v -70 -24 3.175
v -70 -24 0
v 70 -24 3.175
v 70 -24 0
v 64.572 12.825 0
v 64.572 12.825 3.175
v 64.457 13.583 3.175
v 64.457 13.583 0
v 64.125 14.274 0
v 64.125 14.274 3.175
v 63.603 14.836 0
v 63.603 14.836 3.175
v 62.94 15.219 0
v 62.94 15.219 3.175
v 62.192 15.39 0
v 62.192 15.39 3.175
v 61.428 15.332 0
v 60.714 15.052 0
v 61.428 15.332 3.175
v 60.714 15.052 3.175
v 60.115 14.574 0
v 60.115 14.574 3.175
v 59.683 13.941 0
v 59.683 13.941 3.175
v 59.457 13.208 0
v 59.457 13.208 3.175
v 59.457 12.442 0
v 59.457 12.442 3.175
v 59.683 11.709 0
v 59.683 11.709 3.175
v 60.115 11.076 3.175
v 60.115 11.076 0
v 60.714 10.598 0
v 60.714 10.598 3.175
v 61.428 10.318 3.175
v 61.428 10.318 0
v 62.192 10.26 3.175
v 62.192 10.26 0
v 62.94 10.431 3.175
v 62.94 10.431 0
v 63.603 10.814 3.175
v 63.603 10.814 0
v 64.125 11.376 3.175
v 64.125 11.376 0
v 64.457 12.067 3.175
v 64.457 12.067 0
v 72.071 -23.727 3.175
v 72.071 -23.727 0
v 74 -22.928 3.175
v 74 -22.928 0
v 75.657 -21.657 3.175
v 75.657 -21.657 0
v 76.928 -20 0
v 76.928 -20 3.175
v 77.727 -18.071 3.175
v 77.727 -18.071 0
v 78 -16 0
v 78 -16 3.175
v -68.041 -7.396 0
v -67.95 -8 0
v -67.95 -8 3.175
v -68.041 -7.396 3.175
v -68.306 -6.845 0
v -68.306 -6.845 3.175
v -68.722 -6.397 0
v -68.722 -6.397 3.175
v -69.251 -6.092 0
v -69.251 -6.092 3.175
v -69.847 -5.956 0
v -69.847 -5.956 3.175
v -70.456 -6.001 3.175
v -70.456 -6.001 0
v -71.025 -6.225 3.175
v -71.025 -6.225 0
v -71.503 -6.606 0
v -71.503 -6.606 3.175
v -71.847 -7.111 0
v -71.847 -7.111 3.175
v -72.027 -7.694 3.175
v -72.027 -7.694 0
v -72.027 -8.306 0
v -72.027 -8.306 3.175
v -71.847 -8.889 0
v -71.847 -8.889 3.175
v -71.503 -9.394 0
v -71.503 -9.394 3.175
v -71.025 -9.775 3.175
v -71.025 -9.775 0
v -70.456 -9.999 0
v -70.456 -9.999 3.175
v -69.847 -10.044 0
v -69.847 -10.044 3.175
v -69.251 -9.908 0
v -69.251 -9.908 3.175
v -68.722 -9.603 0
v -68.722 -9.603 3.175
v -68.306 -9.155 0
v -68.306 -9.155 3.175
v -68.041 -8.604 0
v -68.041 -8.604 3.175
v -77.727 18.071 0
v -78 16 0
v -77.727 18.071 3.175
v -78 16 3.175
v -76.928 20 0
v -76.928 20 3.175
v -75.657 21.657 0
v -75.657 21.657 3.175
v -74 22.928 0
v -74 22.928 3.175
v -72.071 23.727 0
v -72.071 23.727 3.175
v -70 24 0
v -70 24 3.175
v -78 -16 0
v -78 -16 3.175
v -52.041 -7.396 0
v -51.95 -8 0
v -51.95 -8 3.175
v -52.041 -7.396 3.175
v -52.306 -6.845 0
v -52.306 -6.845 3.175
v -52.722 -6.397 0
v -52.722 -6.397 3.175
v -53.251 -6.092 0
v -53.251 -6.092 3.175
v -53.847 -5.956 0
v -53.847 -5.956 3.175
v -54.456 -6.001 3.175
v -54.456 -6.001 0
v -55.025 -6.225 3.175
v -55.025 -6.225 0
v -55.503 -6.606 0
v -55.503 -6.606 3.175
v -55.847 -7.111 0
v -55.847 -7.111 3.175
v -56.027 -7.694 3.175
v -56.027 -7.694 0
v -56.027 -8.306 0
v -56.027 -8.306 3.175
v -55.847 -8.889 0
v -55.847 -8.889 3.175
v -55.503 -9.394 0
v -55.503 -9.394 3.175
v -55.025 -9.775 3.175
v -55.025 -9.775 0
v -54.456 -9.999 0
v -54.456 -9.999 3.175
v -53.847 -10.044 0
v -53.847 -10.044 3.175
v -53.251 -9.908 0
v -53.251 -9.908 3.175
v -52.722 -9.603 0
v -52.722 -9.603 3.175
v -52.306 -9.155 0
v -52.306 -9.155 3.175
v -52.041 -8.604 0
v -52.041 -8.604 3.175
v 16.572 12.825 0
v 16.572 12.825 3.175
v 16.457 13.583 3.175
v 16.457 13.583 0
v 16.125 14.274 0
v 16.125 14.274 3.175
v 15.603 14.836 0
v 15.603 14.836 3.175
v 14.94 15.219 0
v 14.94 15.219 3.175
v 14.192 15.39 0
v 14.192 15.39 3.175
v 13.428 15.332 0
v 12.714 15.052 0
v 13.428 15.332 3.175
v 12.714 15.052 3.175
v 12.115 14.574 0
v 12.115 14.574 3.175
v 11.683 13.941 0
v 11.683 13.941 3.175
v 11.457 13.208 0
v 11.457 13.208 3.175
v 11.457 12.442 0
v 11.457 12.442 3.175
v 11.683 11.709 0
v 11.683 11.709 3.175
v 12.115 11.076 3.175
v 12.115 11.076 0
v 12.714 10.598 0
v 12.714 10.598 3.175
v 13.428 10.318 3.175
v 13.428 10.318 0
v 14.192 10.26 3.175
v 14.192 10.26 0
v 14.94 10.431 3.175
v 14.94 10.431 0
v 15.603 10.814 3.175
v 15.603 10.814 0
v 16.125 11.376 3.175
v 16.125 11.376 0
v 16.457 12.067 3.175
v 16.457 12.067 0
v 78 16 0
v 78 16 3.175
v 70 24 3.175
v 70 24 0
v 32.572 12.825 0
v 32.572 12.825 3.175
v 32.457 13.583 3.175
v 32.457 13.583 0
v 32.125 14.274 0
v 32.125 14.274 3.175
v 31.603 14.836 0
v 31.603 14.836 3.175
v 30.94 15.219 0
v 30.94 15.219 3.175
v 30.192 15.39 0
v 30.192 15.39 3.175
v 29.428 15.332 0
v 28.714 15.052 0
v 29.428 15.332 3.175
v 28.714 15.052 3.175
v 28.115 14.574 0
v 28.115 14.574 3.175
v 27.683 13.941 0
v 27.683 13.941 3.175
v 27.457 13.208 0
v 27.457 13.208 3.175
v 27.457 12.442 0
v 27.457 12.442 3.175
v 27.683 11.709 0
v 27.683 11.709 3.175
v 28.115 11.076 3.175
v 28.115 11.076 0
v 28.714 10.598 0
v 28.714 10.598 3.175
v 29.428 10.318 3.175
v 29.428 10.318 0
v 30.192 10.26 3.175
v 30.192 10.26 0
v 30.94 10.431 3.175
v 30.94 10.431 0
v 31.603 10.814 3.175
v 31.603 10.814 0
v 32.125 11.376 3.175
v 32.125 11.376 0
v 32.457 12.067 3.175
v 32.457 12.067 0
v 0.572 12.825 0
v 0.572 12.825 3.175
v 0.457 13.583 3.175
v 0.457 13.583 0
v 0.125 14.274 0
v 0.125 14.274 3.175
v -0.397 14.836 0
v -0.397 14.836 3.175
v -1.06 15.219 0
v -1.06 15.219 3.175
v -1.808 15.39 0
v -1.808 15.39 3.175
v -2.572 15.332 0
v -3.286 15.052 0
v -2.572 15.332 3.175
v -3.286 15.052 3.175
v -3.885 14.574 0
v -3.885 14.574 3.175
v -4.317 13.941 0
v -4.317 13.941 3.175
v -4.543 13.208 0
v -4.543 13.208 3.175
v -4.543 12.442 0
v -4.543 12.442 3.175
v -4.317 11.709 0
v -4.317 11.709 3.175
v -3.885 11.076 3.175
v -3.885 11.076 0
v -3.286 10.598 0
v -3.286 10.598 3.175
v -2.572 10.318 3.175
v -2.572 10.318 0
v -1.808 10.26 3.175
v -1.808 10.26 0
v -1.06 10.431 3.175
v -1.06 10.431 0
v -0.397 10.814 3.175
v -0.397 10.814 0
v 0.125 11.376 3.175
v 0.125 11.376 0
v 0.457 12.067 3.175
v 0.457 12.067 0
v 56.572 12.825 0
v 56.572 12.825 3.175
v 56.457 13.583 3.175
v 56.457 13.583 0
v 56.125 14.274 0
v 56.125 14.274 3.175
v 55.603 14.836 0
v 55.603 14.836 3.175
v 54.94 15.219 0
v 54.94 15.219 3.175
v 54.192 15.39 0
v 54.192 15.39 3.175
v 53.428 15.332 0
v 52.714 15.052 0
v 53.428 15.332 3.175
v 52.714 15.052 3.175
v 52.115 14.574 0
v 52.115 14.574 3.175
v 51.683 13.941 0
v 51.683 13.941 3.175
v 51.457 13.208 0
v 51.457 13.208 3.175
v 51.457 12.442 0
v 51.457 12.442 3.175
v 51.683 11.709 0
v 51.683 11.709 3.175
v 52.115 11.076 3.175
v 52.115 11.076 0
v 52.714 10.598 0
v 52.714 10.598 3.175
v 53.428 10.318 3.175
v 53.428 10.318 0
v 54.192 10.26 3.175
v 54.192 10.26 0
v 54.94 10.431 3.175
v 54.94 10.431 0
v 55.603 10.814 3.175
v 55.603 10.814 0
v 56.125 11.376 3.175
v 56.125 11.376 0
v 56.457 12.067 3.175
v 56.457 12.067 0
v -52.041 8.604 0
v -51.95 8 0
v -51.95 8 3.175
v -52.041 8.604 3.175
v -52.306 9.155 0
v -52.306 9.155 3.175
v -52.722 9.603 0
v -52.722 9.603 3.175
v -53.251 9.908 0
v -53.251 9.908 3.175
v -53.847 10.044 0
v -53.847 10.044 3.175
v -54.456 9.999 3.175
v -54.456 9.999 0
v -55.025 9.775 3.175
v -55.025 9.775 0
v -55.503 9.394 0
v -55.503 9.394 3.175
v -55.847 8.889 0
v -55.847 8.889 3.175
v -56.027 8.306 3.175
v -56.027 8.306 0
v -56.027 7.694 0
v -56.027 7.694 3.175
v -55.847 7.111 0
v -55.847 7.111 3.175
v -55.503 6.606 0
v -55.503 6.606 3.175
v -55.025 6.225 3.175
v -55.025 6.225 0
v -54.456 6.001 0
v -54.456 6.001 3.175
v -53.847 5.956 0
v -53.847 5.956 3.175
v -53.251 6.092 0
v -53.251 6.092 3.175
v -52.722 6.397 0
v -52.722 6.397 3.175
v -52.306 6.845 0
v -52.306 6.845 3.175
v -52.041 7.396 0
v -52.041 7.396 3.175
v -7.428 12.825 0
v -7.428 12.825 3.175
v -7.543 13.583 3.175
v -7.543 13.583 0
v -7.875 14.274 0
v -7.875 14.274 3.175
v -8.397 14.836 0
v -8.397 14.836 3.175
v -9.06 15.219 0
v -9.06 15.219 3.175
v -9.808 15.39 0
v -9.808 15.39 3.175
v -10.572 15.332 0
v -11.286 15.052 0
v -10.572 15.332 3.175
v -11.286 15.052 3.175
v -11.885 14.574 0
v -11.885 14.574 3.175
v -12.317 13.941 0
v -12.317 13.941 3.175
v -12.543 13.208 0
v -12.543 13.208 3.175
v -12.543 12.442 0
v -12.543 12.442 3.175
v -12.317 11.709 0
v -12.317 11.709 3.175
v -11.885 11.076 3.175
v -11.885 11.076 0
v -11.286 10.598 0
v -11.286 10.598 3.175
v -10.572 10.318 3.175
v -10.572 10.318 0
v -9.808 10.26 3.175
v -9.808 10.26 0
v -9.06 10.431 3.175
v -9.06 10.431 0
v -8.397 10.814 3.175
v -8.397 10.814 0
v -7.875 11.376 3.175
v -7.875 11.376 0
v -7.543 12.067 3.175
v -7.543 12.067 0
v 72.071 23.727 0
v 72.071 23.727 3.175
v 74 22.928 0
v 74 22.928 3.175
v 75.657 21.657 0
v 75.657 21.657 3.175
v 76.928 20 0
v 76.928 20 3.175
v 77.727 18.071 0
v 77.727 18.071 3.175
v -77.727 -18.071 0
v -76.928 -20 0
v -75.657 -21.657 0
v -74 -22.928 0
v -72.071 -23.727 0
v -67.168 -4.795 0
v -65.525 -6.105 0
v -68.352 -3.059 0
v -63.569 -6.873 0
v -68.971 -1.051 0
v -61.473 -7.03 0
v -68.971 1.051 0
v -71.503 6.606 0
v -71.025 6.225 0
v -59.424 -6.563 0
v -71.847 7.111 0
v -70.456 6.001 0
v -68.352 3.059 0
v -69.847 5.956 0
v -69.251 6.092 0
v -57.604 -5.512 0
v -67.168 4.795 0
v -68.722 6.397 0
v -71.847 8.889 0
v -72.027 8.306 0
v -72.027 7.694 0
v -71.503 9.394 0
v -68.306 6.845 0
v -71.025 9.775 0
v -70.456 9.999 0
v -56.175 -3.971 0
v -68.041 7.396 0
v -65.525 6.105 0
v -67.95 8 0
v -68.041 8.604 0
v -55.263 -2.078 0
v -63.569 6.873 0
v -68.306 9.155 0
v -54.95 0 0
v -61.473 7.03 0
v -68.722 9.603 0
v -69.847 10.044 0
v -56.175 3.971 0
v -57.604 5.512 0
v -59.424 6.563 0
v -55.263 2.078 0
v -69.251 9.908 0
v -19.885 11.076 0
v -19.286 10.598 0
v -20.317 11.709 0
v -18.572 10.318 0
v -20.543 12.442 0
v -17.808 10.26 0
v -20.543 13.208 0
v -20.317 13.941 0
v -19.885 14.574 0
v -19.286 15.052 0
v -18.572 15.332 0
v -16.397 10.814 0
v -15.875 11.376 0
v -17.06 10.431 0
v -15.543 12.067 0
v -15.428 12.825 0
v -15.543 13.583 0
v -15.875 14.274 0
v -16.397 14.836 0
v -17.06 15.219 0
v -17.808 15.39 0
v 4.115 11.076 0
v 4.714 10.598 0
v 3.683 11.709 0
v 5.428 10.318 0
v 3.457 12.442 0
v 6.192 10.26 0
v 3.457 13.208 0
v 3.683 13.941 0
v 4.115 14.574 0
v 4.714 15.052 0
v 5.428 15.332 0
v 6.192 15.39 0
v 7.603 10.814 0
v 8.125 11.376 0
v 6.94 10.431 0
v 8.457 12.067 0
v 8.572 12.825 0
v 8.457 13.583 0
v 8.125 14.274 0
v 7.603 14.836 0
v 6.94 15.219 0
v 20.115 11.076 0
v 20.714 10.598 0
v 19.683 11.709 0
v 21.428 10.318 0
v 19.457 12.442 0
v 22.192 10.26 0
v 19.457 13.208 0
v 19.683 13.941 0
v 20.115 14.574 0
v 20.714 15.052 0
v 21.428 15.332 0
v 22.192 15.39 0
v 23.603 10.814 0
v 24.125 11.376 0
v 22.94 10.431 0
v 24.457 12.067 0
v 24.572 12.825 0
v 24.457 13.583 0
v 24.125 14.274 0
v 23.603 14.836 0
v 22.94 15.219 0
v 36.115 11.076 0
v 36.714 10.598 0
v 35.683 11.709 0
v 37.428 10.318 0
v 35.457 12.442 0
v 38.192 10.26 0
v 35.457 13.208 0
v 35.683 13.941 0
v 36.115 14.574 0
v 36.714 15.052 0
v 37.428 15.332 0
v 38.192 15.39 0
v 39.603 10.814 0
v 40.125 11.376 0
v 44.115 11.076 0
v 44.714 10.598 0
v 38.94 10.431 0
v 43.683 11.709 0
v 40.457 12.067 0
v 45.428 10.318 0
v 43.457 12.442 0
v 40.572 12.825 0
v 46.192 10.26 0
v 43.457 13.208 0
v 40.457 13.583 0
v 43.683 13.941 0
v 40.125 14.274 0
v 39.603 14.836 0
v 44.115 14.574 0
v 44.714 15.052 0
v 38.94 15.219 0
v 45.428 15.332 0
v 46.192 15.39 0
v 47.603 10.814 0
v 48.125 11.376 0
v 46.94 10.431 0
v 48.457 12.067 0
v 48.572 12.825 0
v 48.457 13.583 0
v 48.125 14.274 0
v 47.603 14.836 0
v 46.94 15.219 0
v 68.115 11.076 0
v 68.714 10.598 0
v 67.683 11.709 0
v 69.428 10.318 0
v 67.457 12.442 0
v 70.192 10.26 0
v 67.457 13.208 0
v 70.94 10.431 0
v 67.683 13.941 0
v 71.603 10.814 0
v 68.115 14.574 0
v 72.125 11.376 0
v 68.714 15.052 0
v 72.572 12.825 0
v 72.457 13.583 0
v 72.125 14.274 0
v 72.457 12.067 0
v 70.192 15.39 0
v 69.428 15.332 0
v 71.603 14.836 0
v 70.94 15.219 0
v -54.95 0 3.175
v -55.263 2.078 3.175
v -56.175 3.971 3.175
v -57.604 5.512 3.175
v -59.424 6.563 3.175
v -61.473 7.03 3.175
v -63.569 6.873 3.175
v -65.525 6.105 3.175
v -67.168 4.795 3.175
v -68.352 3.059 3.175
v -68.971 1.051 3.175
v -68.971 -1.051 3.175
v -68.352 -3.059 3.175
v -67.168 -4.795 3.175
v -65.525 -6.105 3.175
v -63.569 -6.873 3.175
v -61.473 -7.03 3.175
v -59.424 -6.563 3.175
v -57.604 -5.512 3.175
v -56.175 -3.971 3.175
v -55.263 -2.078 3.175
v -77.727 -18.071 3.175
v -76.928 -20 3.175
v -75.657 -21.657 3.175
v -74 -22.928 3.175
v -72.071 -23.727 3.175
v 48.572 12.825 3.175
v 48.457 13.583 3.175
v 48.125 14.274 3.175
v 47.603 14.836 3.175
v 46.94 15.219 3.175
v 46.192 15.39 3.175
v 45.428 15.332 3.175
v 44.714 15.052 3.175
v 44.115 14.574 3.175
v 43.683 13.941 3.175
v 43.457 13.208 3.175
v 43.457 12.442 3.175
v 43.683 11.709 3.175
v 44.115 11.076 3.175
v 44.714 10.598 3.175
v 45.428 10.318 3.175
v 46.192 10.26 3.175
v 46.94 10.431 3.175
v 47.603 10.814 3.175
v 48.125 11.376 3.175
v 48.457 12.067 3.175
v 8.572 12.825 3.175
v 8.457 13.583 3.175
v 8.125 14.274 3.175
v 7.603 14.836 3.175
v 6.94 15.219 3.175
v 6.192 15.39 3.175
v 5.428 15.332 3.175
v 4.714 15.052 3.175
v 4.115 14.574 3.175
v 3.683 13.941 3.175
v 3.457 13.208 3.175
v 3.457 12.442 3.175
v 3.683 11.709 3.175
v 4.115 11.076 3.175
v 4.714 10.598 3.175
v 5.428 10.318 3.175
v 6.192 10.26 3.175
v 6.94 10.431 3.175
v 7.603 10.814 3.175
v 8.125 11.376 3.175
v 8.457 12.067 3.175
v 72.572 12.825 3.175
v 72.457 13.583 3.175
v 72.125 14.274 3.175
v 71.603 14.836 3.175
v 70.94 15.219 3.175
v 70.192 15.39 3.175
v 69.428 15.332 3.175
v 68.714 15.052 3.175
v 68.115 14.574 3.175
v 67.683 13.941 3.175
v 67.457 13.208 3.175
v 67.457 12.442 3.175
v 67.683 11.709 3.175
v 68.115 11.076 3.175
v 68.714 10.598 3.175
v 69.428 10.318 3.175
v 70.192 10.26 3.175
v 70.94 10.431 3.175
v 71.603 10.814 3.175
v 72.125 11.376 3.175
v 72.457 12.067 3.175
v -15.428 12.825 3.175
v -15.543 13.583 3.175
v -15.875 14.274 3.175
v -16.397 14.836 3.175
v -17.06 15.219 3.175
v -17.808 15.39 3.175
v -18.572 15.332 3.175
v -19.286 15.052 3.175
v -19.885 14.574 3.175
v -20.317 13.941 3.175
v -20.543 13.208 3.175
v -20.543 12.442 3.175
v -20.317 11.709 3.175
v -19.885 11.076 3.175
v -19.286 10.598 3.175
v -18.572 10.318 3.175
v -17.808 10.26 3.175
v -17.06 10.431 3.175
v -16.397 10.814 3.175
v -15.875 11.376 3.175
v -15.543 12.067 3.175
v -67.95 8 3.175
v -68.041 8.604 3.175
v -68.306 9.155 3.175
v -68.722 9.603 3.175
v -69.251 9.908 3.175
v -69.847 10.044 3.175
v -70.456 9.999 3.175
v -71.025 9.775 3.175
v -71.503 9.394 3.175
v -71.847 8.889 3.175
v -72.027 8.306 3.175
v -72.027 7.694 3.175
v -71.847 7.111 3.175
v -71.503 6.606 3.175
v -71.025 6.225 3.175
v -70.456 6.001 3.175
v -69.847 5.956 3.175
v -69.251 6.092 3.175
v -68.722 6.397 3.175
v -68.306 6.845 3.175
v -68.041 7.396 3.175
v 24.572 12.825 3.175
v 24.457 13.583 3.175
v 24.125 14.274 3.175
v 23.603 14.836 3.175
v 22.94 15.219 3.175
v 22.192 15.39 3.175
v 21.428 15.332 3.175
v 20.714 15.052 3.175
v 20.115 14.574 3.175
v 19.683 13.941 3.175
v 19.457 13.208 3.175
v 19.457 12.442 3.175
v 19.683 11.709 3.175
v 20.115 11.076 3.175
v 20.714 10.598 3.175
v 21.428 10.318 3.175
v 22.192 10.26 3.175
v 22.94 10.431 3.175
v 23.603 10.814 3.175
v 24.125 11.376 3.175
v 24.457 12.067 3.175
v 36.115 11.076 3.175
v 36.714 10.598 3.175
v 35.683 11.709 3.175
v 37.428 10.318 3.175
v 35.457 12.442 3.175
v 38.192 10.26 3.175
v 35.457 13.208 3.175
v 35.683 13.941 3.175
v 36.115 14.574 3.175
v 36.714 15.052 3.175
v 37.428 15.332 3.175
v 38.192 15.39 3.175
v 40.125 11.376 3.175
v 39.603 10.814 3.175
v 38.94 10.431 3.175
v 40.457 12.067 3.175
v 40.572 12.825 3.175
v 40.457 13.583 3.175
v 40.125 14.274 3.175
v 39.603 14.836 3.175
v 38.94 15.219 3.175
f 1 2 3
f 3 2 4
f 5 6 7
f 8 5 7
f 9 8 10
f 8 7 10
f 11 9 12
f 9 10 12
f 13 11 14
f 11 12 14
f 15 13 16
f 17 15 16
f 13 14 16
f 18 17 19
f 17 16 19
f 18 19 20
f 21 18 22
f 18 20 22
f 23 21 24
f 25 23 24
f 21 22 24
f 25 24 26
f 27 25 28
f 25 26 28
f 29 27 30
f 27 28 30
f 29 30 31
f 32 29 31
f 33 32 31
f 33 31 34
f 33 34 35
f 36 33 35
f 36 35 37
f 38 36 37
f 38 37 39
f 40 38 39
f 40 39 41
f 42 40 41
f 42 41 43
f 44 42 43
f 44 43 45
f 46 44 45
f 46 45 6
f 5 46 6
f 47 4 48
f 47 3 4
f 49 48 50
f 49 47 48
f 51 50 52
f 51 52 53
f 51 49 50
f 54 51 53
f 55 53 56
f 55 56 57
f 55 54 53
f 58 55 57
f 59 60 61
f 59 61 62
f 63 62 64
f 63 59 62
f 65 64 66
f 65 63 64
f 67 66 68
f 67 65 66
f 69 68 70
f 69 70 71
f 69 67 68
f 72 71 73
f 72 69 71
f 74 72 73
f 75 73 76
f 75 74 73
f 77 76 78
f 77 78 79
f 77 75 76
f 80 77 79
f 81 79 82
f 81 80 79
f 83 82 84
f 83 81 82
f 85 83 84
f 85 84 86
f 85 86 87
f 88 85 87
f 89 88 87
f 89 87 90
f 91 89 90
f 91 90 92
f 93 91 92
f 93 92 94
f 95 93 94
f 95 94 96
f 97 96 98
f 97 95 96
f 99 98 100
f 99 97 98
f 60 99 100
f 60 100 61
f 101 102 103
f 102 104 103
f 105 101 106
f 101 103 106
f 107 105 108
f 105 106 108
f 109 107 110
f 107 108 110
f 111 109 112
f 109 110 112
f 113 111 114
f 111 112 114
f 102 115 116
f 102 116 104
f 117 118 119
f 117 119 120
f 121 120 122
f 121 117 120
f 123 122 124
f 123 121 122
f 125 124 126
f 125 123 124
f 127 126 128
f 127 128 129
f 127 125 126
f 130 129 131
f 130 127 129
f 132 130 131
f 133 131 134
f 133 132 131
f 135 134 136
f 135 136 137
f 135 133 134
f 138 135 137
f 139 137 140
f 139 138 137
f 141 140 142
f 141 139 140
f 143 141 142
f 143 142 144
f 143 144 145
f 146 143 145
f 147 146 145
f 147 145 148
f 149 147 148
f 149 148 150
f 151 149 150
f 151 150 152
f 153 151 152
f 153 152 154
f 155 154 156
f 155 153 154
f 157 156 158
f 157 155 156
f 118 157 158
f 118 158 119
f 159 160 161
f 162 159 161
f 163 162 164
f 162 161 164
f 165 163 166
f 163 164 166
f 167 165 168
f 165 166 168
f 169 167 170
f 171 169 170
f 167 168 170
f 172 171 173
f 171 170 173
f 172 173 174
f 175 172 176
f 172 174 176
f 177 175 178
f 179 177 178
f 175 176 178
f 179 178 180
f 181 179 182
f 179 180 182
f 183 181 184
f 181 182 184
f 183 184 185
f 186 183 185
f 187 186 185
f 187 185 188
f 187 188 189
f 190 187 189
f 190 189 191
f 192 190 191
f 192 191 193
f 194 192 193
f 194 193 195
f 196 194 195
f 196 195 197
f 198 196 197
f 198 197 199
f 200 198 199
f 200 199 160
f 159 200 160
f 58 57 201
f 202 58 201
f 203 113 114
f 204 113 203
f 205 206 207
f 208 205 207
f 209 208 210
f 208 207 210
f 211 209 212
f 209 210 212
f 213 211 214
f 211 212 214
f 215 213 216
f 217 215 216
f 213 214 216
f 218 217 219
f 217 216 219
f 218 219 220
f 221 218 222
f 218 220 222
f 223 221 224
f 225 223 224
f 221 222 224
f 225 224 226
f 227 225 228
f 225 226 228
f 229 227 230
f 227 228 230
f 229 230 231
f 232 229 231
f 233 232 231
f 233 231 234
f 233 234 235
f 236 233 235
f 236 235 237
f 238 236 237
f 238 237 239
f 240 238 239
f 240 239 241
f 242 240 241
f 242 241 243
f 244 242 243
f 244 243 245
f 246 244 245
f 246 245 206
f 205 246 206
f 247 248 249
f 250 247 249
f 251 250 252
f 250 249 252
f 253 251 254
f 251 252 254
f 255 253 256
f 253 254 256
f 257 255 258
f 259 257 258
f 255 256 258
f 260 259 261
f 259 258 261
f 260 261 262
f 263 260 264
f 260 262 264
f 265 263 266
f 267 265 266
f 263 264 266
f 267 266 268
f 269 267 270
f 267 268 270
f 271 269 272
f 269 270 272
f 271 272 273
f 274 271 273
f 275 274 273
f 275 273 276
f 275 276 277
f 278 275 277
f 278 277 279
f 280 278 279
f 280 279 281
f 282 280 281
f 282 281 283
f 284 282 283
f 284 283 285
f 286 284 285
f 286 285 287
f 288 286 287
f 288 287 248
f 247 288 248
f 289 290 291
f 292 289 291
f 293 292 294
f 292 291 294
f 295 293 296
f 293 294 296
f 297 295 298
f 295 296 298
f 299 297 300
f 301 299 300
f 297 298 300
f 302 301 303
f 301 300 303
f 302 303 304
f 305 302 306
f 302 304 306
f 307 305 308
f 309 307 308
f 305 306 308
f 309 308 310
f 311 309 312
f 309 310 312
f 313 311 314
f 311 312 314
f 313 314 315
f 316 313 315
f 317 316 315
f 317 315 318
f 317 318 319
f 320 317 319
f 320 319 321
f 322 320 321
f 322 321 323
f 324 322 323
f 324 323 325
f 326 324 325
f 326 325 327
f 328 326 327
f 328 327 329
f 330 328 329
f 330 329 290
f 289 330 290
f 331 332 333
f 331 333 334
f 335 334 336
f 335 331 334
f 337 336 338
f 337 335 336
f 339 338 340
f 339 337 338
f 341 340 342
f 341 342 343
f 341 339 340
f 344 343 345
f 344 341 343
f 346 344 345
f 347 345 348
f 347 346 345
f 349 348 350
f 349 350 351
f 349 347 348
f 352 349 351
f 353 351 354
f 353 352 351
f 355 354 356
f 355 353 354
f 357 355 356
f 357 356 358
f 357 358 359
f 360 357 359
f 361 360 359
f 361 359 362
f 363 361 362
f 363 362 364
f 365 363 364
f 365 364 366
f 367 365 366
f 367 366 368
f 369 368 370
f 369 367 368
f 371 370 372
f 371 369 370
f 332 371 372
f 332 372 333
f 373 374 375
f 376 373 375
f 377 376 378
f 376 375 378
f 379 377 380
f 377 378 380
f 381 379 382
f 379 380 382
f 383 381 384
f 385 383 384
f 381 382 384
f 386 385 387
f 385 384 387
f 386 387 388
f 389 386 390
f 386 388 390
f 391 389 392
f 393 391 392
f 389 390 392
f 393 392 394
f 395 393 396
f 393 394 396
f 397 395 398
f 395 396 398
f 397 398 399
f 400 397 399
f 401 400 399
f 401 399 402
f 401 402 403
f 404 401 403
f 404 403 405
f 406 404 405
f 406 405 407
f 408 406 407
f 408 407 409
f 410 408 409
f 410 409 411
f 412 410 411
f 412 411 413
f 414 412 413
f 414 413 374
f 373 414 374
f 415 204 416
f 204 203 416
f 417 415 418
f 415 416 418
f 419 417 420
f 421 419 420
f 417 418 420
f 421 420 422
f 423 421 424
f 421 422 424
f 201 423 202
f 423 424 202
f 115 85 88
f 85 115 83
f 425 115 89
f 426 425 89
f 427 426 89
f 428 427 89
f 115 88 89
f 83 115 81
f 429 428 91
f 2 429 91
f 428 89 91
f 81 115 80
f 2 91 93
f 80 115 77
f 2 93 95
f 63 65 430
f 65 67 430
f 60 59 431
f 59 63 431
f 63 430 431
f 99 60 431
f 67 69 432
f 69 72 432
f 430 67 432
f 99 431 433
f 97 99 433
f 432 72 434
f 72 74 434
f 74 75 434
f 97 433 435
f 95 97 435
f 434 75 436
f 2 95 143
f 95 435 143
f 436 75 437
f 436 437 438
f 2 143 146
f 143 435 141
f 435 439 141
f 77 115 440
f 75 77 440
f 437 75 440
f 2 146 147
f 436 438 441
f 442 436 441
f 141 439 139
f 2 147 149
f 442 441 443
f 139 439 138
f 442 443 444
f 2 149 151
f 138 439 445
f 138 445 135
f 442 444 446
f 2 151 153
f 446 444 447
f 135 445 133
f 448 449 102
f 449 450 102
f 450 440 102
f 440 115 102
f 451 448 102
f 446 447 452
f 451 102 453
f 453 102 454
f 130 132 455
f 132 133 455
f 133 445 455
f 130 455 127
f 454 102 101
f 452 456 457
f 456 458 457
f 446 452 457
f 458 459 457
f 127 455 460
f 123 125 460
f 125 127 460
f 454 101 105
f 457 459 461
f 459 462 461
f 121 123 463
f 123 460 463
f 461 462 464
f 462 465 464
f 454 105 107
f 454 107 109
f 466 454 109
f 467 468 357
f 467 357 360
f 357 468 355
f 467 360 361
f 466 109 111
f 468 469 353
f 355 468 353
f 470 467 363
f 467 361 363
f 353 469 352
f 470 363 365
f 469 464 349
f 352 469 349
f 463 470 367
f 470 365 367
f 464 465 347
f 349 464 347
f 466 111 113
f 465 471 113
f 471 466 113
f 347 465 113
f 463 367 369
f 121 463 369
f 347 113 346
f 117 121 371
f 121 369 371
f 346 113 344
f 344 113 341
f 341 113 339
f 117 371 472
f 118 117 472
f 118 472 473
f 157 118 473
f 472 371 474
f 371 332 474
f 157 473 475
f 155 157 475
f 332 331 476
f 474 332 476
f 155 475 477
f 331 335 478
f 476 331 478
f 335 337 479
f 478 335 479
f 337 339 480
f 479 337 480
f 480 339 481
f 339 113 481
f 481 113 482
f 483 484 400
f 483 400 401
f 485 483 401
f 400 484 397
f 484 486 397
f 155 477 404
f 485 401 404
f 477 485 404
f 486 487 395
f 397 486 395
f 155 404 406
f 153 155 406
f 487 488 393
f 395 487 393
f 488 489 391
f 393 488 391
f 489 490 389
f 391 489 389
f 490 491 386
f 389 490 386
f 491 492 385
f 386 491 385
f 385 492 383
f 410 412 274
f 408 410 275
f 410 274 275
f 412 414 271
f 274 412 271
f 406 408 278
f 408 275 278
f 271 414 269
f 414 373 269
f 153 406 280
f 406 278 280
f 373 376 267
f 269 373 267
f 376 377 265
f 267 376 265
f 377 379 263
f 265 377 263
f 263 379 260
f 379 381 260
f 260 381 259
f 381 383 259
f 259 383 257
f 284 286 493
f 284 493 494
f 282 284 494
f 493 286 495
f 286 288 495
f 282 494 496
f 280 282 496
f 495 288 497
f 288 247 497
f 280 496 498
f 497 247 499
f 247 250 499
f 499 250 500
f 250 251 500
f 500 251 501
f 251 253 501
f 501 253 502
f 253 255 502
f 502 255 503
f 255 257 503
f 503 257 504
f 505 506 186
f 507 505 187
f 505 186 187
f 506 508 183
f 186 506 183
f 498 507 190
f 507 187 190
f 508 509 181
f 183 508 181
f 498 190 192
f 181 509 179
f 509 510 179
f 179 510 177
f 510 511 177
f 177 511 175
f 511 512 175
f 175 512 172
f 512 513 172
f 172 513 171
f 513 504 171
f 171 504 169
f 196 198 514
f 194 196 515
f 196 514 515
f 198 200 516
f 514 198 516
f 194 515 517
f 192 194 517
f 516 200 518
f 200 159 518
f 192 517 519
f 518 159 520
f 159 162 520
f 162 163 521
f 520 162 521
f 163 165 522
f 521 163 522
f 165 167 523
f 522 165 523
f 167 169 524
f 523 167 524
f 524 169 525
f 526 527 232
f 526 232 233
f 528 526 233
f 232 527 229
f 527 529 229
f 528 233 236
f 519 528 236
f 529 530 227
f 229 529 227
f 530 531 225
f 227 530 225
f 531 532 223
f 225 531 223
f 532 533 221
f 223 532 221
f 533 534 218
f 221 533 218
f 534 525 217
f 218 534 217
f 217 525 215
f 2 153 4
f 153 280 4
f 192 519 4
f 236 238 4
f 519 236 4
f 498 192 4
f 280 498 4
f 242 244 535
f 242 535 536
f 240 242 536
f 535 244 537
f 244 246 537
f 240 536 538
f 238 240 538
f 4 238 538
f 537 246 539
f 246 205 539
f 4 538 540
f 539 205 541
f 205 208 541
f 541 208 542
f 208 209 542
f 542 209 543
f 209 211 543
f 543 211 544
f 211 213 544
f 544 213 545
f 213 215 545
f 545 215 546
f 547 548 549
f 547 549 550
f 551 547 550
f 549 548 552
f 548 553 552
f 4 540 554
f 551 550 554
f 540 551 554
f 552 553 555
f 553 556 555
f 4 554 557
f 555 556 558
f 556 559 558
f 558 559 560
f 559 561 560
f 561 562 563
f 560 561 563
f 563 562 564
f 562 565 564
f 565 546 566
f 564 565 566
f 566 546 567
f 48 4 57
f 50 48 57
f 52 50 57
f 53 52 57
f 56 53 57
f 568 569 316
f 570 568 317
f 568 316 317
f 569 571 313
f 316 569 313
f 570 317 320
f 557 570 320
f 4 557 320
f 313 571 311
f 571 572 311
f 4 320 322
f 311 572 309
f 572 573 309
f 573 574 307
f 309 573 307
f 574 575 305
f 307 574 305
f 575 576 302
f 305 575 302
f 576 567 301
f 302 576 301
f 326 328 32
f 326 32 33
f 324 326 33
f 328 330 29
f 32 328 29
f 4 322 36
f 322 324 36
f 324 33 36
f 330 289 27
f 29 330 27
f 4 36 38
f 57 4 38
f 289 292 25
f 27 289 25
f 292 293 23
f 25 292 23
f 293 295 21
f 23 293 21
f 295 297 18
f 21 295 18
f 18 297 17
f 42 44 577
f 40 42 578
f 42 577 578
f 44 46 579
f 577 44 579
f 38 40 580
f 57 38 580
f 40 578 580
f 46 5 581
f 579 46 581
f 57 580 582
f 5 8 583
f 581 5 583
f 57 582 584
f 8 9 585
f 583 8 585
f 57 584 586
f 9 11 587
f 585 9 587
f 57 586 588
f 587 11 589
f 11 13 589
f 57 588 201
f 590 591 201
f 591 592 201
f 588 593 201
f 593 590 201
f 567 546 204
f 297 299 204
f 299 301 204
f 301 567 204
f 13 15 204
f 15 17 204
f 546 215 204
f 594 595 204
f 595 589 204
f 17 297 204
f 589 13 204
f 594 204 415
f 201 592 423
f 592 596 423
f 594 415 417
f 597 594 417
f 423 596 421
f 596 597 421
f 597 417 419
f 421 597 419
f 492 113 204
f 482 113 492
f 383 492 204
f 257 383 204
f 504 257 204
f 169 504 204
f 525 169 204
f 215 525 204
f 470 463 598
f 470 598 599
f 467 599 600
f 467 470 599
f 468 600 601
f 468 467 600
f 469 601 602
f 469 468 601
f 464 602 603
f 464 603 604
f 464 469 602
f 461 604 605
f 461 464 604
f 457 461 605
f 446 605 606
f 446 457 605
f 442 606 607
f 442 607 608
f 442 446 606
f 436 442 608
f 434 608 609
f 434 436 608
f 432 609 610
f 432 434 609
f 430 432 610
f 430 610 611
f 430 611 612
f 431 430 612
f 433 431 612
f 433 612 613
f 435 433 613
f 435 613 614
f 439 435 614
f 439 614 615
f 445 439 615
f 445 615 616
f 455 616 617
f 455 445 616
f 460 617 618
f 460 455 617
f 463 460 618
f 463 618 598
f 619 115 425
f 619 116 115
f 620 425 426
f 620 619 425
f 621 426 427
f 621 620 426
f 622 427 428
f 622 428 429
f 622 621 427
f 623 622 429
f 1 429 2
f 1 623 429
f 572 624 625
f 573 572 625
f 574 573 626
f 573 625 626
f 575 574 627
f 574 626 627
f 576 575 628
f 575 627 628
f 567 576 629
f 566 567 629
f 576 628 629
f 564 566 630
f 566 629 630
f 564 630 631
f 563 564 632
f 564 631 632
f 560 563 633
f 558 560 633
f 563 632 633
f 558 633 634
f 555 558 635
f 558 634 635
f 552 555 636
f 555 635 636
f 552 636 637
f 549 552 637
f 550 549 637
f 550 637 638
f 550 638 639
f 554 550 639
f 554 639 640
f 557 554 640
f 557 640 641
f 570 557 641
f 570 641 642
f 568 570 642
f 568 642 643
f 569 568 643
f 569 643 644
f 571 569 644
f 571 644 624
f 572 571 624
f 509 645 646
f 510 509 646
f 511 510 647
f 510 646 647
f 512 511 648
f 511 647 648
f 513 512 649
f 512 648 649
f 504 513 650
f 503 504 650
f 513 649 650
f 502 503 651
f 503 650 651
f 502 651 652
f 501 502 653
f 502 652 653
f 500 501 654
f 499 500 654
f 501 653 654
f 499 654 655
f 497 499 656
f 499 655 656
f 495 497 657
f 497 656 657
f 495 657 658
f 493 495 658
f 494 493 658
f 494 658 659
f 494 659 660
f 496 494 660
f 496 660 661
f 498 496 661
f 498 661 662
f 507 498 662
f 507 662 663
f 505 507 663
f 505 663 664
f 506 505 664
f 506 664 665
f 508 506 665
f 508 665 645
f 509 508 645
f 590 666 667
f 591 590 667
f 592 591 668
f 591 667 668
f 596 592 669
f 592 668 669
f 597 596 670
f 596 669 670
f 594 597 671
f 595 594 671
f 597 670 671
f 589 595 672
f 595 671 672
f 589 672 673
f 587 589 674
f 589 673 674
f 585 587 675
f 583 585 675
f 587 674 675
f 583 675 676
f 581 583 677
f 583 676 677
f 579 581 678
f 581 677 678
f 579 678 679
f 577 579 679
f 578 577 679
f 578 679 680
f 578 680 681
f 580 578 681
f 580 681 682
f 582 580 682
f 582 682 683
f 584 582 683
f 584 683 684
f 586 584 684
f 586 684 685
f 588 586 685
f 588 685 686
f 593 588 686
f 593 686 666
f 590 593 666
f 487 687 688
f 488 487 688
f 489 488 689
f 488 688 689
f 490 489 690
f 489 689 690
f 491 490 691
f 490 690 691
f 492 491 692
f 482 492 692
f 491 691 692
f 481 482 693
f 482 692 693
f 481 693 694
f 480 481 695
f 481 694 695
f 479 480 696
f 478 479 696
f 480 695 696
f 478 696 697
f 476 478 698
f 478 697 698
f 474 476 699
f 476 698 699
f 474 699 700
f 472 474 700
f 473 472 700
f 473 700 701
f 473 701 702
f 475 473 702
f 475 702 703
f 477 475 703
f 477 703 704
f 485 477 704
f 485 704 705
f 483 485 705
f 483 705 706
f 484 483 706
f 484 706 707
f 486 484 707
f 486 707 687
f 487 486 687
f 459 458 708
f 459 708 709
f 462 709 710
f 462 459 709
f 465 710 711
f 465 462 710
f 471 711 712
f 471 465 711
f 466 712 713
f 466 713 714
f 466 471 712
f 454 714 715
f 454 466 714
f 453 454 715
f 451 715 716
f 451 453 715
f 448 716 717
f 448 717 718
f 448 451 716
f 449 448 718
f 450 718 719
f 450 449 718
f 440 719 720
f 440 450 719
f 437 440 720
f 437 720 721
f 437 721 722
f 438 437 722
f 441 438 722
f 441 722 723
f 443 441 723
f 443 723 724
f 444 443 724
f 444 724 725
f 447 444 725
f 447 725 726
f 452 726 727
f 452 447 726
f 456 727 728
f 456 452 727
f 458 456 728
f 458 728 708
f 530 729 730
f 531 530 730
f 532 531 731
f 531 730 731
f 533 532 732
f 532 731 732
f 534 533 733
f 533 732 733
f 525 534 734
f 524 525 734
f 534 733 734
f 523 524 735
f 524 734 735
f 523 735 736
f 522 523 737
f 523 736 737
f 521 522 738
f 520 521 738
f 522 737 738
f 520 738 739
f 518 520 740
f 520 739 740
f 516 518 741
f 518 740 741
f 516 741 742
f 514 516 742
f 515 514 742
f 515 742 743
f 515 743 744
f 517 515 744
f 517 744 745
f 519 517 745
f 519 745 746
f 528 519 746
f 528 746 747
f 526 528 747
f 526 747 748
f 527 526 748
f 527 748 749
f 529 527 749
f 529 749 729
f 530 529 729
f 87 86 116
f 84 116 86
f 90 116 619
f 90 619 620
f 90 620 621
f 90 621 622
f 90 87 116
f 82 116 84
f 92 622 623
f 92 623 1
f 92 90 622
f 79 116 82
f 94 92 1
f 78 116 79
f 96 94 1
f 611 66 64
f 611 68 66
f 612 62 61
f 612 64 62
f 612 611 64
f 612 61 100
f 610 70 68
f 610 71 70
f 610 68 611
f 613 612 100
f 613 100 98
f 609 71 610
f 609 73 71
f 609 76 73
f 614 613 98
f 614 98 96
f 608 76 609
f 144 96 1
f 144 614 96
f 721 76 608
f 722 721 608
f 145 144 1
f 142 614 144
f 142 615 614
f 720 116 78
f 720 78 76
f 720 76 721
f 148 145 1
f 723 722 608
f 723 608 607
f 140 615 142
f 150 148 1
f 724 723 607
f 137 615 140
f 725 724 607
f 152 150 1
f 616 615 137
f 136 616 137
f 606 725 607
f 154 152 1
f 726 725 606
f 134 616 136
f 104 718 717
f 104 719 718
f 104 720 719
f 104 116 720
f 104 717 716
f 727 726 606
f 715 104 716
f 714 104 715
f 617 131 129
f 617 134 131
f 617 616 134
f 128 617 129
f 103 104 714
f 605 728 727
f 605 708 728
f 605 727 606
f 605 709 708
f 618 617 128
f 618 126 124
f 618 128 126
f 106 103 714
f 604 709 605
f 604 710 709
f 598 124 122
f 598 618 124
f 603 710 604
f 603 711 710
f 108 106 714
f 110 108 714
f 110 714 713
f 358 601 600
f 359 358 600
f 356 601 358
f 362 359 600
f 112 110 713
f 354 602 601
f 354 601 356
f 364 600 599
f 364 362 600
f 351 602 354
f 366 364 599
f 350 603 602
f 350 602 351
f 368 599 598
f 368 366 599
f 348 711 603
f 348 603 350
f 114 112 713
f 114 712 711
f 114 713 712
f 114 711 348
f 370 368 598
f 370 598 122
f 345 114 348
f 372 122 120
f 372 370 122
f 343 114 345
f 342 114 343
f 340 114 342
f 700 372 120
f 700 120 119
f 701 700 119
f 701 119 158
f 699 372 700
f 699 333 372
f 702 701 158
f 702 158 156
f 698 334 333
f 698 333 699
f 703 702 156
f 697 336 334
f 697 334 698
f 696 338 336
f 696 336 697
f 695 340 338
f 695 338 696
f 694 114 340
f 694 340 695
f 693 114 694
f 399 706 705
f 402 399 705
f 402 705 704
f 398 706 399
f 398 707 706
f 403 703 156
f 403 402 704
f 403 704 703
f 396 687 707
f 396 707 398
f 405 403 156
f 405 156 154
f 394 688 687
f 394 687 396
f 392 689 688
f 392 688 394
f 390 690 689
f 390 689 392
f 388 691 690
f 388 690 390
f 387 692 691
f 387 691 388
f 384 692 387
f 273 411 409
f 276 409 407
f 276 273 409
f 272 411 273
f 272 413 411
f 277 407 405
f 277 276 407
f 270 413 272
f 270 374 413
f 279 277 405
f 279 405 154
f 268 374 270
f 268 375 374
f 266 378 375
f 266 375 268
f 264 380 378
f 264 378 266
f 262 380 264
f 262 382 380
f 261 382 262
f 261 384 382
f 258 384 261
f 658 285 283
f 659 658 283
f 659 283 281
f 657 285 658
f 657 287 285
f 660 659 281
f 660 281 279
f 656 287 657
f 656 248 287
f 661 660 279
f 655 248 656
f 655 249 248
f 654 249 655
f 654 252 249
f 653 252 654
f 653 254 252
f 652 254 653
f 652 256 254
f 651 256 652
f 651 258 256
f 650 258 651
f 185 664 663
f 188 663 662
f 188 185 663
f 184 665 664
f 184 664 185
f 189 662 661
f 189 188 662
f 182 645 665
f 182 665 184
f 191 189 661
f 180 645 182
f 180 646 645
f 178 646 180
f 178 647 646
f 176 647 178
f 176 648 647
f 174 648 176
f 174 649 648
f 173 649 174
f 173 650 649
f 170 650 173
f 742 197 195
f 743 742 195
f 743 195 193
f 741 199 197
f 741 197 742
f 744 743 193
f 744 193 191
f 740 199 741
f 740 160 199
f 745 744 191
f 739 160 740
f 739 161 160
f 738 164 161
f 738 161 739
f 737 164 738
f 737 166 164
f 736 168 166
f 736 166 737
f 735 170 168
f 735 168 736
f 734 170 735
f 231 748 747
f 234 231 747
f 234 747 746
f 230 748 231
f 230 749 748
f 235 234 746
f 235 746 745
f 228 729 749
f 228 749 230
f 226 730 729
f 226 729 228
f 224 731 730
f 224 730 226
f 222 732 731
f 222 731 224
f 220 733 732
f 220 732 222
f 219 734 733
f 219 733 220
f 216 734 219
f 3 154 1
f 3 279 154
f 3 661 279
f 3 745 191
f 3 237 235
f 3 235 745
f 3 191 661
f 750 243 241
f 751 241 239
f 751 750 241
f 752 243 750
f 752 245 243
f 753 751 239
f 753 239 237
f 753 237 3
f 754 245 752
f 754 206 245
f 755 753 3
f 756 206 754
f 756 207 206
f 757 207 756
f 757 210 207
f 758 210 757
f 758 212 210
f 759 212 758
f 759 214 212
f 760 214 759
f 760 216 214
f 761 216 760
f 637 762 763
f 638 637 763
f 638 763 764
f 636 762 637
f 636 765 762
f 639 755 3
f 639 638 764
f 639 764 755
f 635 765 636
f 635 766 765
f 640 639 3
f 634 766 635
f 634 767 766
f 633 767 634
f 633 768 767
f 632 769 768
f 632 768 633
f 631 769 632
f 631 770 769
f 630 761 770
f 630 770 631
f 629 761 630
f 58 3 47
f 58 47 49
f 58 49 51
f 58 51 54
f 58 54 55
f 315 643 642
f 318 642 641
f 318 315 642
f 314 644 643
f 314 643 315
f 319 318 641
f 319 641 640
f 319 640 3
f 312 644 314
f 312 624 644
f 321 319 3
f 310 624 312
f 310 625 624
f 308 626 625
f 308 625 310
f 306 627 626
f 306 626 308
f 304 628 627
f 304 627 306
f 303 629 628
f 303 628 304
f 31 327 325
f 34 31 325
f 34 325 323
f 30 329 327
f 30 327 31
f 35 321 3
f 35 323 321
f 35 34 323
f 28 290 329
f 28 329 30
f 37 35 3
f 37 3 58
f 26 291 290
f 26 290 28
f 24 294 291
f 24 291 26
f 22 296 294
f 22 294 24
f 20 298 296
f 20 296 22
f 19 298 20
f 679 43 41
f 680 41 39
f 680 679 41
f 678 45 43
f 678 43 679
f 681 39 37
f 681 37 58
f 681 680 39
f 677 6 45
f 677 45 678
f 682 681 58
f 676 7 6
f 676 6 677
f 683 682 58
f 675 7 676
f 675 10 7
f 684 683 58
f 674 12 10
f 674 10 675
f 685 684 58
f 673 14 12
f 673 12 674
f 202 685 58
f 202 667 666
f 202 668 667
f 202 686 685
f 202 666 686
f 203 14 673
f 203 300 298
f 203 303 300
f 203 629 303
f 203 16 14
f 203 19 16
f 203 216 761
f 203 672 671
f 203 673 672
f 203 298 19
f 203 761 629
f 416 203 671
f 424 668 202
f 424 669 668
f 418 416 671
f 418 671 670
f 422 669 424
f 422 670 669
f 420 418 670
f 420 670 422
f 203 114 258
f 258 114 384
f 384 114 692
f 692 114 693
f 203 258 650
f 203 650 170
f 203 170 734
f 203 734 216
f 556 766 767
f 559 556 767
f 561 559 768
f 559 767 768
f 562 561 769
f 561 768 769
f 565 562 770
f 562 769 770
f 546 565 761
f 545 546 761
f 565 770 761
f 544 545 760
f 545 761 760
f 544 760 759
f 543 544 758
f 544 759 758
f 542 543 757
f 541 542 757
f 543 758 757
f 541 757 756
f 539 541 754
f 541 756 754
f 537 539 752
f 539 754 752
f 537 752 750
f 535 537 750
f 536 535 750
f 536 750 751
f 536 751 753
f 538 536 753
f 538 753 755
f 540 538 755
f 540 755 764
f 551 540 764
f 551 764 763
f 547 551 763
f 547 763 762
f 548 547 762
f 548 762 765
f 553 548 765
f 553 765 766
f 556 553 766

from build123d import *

# Parameters (mm, degrees)
SKETCH2_W           = 156
SKETCH2_H           = 48
SKETCH2_R           = 2.05
SKETCH2_R_2         = 7.05
BOSS_EXTRUDE2_DEPTH = 3.175
FILLET1_R           = 8
SKETCH3_R           = 2.571717643
CUT_EXTRUDE1_DEPTH  = 10


with BuildPart() as part:
    # Sketch2 → Boss-Extrude2 (new body)
    with BuildSketch(Plane.XY):
        Rectangle(SKETCH2_W, SKETCH2_H)
        with Locations((-70, 8)):
            Circle(SKETCH2_R, mode=Mode.SUBTRACT)
        with Locations((-54, 8)):
            Circle(SKETCH2_R, mode=Mode.SUBTRACT)
        with Locations((-54, -8)):
            Circle(SKETCH2_R, mode=Mode.SUBTRACT)
        with Locations((-70, -8)):
            Circle(SKETCH2_R, mode=Mode.SUBTRACT)
        with Locations((-62, 0)):
            Circle(SKETCH2_R_2, mode=Mode.SUBTRACT)
    extrude(amount=BOSS_EXTRUDE2_DEPTH)

    # Fillet1
    fillet1_edges = [part.edges().sort_by_distance(p)[0] for p in [
        (78, 24, 1.5875),
        (78, -24, 1.5875),
        (-78, -24, 1.5875),
        (-78, 24, 1.5875),
    ]]
    fillet(fillet1_edges, radius=FILLET1_R)

    # Sketch3 → Cut-Extrude1 (cut)
    with BuildSketch(Plane.XY.offset(3.175)):
        with Locations((70, 12.825)):
            Circle(SKETCH3_R)
        with Locations((62, 12.825)):
            Circle(SKETCH3_R)
        with Locations((54, 12.825)):
            Circle(SKETCH3_R)
        with Locations((46, 12.825)):
            Circle(SKETCH3_R)
        with Locations((38, 12.825)):
            Circle(SKETCH3_R)
        with Locations((30, 12.825)):
            Circle(SKETCH3_R)
        with Locations((22, 12.825)):
            Circle(SKETCH3_R)
        with Locations((14, 12.825)):
            Circle(SKETCH3_R)
        with Locations((6, 12.825)):
            Circle(SKETCH3_R)
        with Locations((-2, 12.825)):
            Circle(SKETCH3_R)
        with Locations((-10, 12.825)):
            Circle(SKETCH3_R)
        with Locations((-18, 12.825)):
            Circle(SKETCH3_R)
    extrude(amount=-CUT_EXTRUDE1_DEPTH, mode=Mode.SUBTRACT)


solid = part.part
